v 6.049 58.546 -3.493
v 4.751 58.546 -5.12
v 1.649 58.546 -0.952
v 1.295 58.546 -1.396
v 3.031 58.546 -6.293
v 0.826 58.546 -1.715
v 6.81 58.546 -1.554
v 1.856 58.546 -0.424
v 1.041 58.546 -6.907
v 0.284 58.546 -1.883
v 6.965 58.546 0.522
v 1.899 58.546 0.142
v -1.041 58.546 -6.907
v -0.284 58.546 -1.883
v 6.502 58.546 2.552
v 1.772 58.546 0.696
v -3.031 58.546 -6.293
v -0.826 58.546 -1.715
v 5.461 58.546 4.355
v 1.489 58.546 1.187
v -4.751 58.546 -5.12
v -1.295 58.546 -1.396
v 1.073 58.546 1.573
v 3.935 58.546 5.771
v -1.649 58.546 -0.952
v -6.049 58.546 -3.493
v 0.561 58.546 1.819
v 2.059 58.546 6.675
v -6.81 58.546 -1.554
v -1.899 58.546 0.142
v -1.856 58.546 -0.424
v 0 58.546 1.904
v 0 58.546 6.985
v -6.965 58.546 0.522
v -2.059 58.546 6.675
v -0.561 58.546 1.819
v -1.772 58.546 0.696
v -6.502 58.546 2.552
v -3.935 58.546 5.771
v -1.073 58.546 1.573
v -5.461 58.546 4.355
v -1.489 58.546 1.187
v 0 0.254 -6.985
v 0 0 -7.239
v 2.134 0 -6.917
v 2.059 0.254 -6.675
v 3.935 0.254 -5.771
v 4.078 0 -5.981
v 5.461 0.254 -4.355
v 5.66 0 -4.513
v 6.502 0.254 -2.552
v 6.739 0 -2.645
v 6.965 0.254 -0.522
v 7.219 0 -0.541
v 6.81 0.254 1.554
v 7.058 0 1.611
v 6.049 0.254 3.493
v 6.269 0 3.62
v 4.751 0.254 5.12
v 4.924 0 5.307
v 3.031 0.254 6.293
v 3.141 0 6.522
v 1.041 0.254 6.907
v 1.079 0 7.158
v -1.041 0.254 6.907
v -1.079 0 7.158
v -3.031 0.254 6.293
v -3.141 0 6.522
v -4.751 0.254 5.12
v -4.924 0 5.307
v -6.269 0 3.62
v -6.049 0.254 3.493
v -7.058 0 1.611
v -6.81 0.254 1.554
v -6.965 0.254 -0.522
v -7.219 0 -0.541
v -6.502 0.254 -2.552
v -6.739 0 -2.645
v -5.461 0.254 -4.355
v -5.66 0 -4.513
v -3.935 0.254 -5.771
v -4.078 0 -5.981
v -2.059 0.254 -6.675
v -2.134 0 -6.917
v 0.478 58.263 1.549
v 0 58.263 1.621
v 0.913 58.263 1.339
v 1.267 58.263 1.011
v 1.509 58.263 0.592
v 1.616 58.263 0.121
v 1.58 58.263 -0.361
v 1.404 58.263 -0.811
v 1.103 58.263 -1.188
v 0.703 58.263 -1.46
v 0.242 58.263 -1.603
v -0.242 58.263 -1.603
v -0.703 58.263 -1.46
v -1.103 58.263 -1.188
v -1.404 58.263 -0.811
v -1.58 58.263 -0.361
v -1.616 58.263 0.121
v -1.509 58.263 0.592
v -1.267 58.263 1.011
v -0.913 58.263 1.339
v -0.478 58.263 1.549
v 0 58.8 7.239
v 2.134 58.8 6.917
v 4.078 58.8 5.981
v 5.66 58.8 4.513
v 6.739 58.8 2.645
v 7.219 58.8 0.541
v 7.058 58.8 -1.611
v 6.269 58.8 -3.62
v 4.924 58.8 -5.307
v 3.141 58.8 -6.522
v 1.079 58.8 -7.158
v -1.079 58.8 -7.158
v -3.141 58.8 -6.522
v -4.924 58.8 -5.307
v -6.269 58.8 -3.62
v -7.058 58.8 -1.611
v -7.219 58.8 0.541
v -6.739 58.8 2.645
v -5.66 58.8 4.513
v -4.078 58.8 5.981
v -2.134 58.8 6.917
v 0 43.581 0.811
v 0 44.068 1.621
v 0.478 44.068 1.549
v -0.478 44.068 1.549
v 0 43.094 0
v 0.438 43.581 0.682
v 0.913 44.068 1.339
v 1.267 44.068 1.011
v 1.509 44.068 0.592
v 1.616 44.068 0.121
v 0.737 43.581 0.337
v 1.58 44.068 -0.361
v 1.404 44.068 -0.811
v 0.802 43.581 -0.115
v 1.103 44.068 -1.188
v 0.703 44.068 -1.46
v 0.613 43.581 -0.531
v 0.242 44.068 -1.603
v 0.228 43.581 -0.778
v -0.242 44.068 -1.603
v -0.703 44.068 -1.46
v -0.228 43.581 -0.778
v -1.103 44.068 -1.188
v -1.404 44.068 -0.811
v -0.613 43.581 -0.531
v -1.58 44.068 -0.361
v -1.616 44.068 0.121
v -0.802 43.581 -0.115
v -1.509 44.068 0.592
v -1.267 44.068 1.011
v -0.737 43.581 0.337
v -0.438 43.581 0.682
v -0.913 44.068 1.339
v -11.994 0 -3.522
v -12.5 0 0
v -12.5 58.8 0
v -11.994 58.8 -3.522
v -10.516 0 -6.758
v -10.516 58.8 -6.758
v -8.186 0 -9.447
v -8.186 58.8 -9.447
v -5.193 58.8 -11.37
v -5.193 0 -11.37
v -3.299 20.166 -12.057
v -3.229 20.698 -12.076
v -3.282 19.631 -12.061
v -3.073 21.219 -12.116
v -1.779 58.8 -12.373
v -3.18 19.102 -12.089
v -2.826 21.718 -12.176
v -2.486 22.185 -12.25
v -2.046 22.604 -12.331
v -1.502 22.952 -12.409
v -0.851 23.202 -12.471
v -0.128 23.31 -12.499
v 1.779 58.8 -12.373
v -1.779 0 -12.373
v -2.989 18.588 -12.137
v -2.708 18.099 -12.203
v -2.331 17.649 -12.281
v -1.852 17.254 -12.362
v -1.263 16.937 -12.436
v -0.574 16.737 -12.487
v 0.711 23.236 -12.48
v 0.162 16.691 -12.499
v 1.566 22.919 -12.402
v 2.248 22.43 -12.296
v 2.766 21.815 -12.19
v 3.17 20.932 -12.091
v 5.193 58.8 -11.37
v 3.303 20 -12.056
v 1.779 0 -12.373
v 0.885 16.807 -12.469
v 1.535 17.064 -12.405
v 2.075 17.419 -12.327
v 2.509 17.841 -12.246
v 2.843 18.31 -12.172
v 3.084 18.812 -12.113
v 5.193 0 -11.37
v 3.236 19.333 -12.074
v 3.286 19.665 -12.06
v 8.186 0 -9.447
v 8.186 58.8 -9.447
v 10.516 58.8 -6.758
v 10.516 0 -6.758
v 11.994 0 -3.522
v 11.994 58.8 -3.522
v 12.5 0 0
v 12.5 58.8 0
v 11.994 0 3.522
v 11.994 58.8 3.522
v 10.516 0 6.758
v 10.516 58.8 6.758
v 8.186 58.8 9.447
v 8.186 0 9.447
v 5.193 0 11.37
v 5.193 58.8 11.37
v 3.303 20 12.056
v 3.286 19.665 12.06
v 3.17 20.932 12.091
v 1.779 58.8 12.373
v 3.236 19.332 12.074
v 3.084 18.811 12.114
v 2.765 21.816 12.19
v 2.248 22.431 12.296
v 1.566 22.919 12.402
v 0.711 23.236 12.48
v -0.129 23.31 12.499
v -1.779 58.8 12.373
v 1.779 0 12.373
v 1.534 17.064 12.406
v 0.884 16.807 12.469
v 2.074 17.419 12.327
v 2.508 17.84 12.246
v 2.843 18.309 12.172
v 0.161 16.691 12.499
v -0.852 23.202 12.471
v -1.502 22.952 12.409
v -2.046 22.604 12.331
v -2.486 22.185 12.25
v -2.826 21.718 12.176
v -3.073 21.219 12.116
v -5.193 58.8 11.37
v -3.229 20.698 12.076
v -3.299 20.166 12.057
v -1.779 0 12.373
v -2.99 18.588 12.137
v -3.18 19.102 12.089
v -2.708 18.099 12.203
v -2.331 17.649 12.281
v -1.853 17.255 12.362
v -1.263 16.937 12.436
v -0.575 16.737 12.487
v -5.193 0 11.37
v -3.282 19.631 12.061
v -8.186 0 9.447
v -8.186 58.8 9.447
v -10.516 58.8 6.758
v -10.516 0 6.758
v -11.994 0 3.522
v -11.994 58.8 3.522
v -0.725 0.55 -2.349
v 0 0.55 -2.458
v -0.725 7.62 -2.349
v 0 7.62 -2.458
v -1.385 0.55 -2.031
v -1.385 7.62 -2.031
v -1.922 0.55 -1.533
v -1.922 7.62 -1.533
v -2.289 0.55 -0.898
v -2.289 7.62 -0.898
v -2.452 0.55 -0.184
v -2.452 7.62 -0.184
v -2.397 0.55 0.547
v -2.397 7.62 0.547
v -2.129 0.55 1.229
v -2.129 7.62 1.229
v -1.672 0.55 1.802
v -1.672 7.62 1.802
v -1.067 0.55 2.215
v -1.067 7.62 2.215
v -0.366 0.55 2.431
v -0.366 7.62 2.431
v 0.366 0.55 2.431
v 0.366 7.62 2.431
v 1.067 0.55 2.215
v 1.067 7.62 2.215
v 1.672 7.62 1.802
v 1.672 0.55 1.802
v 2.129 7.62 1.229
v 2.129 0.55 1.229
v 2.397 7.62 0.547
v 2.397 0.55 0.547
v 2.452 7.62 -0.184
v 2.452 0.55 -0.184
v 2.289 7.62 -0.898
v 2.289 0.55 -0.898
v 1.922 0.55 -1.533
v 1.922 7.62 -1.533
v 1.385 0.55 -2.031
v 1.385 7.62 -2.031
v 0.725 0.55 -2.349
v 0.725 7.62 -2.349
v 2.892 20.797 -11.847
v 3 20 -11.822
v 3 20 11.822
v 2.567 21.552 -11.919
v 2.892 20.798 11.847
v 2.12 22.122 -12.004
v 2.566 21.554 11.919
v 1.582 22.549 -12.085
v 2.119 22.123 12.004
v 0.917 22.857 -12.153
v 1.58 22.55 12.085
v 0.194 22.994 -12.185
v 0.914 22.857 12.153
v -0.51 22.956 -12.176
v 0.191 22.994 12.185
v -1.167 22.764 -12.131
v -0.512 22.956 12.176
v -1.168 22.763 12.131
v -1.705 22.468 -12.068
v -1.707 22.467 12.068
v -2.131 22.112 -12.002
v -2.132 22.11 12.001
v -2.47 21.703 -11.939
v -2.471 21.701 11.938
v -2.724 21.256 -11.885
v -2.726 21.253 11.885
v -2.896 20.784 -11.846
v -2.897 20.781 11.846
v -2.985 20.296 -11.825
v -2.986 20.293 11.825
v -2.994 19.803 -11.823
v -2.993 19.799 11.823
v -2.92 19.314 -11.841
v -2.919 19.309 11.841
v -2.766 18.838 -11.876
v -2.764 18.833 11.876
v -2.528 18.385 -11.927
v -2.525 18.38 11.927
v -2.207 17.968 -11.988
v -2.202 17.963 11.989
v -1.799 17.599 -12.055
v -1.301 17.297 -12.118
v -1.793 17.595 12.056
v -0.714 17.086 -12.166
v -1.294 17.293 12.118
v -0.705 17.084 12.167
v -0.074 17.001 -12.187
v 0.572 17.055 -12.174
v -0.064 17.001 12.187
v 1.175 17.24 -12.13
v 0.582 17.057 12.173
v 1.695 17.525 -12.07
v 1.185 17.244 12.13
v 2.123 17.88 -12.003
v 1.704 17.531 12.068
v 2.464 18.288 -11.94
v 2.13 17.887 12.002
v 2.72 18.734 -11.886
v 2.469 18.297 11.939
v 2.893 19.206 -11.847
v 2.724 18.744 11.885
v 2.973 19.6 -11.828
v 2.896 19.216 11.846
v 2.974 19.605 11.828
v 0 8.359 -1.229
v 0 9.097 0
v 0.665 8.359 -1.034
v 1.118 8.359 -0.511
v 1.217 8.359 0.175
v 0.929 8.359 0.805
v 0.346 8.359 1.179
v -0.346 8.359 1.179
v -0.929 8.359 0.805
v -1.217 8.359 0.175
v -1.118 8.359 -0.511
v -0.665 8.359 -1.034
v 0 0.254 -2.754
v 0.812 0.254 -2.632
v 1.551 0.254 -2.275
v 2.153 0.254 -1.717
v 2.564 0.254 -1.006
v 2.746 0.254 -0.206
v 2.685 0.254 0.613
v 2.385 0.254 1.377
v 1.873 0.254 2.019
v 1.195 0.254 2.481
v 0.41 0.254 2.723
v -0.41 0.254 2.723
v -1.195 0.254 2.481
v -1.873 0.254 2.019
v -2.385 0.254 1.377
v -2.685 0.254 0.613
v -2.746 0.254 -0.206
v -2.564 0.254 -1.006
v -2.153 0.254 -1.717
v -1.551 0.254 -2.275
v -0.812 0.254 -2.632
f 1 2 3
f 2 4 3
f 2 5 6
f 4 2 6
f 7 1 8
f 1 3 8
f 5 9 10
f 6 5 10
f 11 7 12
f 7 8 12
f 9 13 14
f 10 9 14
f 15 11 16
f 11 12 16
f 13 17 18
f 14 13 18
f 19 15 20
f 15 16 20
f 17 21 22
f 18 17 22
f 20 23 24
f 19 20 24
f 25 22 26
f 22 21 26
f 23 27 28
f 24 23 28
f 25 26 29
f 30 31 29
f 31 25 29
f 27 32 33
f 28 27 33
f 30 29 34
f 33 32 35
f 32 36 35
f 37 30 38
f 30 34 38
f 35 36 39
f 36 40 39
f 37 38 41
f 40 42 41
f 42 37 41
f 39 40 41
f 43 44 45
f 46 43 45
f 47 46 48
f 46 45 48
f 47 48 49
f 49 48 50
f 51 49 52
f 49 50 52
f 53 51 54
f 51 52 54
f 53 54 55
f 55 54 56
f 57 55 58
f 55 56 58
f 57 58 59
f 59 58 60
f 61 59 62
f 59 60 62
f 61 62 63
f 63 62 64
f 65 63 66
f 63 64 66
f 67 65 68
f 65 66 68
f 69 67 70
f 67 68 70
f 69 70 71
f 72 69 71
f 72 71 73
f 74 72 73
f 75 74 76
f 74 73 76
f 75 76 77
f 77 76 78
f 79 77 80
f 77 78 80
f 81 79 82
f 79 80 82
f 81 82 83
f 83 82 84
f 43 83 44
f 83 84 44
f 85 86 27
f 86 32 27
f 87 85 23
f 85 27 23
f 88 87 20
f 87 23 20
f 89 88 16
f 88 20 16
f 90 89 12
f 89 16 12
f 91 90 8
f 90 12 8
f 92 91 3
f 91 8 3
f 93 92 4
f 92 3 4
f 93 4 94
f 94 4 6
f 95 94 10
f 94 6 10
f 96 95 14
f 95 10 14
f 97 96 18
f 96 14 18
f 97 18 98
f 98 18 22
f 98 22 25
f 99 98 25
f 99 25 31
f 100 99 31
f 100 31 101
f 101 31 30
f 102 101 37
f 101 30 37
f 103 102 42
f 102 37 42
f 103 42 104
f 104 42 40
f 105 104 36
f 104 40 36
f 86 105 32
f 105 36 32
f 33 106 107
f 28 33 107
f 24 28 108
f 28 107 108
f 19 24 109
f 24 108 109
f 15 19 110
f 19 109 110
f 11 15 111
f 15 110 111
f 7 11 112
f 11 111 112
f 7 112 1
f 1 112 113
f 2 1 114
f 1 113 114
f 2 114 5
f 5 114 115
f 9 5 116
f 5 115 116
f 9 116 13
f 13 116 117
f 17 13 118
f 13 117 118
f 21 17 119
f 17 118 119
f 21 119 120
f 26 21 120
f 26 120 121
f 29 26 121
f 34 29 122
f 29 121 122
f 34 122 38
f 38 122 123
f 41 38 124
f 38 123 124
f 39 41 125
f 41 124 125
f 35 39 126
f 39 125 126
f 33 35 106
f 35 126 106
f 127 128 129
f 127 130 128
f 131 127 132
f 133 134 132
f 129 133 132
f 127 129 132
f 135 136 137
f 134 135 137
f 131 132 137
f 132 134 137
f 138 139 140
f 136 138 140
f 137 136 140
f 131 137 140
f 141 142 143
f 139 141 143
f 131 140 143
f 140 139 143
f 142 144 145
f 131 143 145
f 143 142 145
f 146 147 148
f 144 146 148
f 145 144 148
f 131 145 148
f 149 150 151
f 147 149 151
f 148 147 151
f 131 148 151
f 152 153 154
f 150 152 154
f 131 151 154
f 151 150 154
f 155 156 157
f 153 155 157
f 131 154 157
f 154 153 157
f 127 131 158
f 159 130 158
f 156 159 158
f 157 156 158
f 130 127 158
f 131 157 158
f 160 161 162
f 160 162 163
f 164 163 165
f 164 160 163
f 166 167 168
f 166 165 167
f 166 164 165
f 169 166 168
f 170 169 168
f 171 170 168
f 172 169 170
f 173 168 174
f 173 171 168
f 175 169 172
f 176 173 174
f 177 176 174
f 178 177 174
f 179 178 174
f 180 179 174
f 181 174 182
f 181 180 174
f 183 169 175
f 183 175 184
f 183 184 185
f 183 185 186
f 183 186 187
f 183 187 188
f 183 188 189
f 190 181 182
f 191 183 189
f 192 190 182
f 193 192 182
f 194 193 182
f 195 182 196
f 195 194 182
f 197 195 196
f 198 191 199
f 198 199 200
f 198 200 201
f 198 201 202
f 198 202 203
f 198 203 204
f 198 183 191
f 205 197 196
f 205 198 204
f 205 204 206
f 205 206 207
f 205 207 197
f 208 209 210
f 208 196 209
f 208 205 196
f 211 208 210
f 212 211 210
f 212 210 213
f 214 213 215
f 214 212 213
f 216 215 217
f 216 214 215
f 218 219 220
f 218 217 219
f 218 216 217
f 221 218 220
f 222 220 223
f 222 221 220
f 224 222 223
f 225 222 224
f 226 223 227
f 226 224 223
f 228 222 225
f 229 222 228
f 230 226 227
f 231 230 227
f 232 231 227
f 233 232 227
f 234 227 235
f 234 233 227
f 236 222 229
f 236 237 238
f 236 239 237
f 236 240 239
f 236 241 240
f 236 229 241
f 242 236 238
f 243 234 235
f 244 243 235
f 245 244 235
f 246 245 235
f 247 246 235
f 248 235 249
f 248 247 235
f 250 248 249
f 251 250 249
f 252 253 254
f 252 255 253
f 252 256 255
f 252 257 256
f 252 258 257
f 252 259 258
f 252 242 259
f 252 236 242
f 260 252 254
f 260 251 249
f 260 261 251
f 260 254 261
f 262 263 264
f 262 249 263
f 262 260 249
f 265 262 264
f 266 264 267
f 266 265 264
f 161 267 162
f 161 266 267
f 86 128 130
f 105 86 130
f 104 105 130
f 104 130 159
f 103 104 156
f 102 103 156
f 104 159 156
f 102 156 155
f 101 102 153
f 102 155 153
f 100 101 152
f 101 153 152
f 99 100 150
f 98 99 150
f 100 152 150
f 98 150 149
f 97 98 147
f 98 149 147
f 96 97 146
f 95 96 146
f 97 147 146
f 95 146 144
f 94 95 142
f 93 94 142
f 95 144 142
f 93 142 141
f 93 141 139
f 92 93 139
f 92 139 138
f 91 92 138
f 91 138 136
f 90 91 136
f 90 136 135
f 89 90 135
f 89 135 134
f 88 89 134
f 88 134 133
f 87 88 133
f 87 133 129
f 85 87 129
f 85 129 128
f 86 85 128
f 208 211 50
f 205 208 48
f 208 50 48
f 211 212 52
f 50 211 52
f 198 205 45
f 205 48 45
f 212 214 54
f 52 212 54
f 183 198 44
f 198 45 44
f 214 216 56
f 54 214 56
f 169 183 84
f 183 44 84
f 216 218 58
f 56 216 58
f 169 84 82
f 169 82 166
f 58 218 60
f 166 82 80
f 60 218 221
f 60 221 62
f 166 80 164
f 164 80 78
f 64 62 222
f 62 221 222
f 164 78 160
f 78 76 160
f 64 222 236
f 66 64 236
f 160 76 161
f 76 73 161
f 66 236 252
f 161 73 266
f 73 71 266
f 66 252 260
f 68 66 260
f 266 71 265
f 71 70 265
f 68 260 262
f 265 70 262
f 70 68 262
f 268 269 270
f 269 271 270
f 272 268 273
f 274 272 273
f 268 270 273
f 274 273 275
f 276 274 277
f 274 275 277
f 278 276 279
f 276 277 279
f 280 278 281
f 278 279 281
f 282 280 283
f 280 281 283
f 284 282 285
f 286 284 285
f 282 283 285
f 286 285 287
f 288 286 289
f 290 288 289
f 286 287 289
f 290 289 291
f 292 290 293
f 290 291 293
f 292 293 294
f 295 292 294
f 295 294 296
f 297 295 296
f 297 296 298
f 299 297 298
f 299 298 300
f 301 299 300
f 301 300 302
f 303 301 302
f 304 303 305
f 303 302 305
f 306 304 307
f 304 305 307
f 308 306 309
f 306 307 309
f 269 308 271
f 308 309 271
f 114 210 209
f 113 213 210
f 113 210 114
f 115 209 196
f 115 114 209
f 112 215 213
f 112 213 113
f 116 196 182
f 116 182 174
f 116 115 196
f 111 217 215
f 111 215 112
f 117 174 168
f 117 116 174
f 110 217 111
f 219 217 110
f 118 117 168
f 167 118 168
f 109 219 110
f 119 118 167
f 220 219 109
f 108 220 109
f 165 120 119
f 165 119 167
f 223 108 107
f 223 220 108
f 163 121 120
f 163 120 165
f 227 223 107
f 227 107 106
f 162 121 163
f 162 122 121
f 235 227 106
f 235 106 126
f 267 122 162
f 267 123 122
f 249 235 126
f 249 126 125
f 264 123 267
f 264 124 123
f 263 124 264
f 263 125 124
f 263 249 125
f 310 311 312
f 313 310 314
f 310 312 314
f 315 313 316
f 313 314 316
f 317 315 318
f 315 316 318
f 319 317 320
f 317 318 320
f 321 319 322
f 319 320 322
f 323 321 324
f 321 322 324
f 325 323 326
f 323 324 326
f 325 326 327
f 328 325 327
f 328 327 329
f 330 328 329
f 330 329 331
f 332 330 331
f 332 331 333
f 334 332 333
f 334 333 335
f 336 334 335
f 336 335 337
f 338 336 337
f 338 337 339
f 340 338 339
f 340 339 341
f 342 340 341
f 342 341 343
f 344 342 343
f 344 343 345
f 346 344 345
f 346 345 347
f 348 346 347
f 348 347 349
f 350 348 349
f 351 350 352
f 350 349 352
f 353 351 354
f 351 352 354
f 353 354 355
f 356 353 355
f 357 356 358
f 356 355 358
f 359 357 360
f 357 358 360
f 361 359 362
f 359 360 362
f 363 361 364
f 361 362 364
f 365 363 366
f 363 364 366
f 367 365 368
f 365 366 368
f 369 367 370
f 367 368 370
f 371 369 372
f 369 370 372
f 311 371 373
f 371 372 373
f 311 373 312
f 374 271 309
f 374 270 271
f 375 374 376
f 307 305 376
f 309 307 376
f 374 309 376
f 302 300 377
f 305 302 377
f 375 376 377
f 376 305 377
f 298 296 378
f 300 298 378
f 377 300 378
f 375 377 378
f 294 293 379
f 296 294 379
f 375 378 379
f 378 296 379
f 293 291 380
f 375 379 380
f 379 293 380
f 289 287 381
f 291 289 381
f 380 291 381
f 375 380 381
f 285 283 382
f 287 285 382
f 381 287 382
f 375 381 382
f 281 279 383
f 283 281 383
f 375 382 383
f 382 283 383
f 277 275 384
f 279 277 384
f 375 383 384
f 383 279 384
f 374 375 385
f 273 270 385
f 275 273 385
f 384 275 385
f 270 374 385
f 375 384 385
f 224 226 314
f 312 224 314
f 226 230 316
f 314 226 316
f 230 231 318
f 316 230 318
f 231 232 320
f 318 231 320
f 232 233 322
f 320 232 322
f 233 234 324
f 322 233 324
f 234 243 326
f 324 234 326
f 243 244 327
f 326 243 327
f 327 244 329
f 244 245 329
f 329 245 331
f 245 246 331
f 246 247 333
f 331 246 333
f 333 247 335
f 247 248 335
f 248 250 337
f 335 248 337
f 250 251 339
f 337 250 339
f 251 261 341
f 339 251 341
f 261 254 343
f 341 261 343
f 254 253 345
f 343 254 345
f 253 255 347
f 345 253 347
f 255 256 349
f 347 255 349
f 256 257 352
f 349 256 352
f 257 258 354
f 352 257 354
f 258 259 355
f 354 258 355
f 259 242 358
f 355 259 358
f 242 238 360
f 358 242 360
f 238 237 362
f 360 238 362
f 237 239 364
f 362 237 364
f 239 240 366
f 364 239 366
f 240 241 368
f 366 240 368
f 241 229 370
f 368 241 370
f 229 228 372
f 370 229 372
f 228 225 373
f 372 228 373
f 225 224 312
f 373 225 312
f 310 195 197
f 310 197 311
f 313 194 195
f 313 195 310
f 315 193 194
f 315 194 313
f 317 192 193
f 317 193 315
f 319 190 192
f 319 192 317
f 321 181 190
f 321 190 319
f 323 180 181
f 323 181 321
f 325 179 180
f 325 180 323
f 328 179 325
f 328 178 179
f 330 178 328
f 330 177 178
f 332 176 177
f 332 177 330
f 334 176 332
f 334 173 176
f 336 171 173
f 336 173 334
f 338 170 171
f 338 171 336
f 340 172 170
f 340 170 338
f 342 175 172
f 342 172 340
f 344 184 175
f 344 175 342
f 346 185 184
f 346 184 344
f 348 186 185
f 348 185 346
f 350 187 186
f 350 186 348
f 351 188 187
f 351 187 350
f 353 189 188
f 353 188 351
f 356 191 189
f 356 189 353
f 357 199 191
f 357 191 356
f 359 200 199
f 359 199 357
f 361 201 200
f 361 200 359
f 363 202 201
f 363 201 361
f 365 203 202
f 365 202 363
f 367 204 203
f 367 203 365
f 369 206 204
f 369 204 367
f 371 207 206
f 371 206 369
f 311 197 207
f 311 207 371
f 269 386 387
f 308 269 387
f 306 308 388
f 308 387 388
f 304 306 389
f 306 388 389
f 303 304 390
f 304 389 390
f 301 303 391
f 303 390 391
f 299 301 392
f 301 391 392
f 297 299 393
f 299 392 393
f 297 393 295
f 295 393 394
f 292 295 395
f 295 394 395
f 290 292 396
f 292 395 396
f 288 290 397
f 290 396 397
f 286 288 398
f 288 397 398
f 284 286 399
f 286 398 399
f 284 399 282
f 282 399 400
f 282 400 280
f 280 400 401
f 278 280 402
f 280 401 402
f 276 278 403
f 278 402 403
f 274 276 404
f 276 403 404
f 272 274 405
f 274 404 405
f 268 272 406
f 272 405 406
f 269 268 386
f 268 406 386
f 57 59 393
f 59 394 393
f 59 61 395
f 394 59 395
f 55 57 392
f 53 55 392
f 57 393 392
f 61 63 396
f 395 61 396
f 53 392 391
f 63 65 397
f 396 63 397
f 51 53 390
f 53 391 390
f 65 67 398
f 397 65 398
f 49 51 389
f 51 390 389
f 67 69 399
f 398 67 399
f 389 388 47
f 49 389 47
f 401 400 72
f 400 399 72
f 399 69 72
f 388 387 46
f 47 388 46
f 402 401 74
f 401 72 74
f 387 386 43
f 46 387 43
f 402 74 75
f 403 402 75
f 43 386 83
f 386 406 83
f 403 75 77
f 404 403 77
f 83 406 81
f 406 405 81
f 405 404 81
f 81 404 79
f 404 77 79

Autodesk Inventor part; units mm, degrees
ref_plane "YZ Plane" through (0, 0, 0) normal (1, 0, 0) x (0, 1, 0)
ref_plane "XZ Plane" through (0, 0, 0) normal (0, 1, 0) x (-1, 0, 0)
ref_plane "XY Plane" through (0, 0, 0) normal (0, 0, 1) x (1, 0, 0)
sketch "Sketch1" plane through (0, 0, 0) normal (0, 1, 0) x (-1, 0, 0)
  circle A0 centre (0, 0) radius 12.5
  dimension "d0" = 25
extrude "Extrusion1" add sketch "Sketch1" along normal blind 58.8
hole "ReliefTop" at (0, 58.8, 0) direction (0, -1, 0) diameter 13.97 depth 0.254 countersink diameter 14.478 countersink angle 90
hole "ReliefBottom" at (0, 0, 0) direction (0, 1, 0) diameter 13.97 depth 0.254 countersink diameter 14.478 countersink angle 90
hole "MountBottomM6" at (0, 0.254, 0) direction (0, 1, 0) diameter 4.917 depth 7.366 tip angle 118 countersink diameter 5.508 countersink angle 90 thread size "M6x1" class "6H" standard "ISO Metric profile"
hole "MountTopM4" at (0, 58.546, 0) direction (0, -1, 0) diameter 3.242 depth 14.478 tip angle 118 countersink diameter 3.808 countersink angle 90 thread size "M4x0.7" class "6H" standard "ISO Metric profile"
sketch "Sketch2" plane through (0, 0, 0) normal (0, 0, 1) x (1, 0, 0)
  circle A0 centre (0, 20) radius 3
  line L0 (-12.5, 0) -> (12.5, 0) projected
  line L1 (0, -4.6) -> (0, 27.6) projected
  point P0 (0, 0)
  dimension "d49" = 6
  dimension "d50" = 20
extrude "Extrusion2" cut sketch "Sketch2" along normal through all both and the other way through all
chamfer "Chamfer1" distance 0.313 angle 45 2 edges at (-3, 19.9998, 12.1347) (-3, 19.9998, -12.1347)
equation "\"d1\" = height"
equation "\"d5\" = reliefMinor"
equation "\"d7\" = reliefMajor"
equation "\"d10\" = reliefDepth"
equation "\"d14\" = reliefMinor"
equation "\"d16\" = reliefMajor"
equation "\"d19\" = reliefDepth"
equation "\"d25\" = chamferM6"
equation "\"d28\" = depthM6"
equation "\"d40\" = chamferM4"
equation "\"d43\" = depthM4"
equation "\"reliefDepth\" = 0.254"
equation "\"reliefMinor\" = 13.97"
equation "\"reliefMajor\" = 14.478"
equation "\"chamferM6\" = 5.508"
equation "\"chamferM4\" = 3.808"
equation "\"depthM6\" = 7.366"
equation "\"depthM4\" = 14.478"
equation "\"height\" = 58.8"
properties part number "PLS-P642H0588A00_M" material "Stainless Steel"
